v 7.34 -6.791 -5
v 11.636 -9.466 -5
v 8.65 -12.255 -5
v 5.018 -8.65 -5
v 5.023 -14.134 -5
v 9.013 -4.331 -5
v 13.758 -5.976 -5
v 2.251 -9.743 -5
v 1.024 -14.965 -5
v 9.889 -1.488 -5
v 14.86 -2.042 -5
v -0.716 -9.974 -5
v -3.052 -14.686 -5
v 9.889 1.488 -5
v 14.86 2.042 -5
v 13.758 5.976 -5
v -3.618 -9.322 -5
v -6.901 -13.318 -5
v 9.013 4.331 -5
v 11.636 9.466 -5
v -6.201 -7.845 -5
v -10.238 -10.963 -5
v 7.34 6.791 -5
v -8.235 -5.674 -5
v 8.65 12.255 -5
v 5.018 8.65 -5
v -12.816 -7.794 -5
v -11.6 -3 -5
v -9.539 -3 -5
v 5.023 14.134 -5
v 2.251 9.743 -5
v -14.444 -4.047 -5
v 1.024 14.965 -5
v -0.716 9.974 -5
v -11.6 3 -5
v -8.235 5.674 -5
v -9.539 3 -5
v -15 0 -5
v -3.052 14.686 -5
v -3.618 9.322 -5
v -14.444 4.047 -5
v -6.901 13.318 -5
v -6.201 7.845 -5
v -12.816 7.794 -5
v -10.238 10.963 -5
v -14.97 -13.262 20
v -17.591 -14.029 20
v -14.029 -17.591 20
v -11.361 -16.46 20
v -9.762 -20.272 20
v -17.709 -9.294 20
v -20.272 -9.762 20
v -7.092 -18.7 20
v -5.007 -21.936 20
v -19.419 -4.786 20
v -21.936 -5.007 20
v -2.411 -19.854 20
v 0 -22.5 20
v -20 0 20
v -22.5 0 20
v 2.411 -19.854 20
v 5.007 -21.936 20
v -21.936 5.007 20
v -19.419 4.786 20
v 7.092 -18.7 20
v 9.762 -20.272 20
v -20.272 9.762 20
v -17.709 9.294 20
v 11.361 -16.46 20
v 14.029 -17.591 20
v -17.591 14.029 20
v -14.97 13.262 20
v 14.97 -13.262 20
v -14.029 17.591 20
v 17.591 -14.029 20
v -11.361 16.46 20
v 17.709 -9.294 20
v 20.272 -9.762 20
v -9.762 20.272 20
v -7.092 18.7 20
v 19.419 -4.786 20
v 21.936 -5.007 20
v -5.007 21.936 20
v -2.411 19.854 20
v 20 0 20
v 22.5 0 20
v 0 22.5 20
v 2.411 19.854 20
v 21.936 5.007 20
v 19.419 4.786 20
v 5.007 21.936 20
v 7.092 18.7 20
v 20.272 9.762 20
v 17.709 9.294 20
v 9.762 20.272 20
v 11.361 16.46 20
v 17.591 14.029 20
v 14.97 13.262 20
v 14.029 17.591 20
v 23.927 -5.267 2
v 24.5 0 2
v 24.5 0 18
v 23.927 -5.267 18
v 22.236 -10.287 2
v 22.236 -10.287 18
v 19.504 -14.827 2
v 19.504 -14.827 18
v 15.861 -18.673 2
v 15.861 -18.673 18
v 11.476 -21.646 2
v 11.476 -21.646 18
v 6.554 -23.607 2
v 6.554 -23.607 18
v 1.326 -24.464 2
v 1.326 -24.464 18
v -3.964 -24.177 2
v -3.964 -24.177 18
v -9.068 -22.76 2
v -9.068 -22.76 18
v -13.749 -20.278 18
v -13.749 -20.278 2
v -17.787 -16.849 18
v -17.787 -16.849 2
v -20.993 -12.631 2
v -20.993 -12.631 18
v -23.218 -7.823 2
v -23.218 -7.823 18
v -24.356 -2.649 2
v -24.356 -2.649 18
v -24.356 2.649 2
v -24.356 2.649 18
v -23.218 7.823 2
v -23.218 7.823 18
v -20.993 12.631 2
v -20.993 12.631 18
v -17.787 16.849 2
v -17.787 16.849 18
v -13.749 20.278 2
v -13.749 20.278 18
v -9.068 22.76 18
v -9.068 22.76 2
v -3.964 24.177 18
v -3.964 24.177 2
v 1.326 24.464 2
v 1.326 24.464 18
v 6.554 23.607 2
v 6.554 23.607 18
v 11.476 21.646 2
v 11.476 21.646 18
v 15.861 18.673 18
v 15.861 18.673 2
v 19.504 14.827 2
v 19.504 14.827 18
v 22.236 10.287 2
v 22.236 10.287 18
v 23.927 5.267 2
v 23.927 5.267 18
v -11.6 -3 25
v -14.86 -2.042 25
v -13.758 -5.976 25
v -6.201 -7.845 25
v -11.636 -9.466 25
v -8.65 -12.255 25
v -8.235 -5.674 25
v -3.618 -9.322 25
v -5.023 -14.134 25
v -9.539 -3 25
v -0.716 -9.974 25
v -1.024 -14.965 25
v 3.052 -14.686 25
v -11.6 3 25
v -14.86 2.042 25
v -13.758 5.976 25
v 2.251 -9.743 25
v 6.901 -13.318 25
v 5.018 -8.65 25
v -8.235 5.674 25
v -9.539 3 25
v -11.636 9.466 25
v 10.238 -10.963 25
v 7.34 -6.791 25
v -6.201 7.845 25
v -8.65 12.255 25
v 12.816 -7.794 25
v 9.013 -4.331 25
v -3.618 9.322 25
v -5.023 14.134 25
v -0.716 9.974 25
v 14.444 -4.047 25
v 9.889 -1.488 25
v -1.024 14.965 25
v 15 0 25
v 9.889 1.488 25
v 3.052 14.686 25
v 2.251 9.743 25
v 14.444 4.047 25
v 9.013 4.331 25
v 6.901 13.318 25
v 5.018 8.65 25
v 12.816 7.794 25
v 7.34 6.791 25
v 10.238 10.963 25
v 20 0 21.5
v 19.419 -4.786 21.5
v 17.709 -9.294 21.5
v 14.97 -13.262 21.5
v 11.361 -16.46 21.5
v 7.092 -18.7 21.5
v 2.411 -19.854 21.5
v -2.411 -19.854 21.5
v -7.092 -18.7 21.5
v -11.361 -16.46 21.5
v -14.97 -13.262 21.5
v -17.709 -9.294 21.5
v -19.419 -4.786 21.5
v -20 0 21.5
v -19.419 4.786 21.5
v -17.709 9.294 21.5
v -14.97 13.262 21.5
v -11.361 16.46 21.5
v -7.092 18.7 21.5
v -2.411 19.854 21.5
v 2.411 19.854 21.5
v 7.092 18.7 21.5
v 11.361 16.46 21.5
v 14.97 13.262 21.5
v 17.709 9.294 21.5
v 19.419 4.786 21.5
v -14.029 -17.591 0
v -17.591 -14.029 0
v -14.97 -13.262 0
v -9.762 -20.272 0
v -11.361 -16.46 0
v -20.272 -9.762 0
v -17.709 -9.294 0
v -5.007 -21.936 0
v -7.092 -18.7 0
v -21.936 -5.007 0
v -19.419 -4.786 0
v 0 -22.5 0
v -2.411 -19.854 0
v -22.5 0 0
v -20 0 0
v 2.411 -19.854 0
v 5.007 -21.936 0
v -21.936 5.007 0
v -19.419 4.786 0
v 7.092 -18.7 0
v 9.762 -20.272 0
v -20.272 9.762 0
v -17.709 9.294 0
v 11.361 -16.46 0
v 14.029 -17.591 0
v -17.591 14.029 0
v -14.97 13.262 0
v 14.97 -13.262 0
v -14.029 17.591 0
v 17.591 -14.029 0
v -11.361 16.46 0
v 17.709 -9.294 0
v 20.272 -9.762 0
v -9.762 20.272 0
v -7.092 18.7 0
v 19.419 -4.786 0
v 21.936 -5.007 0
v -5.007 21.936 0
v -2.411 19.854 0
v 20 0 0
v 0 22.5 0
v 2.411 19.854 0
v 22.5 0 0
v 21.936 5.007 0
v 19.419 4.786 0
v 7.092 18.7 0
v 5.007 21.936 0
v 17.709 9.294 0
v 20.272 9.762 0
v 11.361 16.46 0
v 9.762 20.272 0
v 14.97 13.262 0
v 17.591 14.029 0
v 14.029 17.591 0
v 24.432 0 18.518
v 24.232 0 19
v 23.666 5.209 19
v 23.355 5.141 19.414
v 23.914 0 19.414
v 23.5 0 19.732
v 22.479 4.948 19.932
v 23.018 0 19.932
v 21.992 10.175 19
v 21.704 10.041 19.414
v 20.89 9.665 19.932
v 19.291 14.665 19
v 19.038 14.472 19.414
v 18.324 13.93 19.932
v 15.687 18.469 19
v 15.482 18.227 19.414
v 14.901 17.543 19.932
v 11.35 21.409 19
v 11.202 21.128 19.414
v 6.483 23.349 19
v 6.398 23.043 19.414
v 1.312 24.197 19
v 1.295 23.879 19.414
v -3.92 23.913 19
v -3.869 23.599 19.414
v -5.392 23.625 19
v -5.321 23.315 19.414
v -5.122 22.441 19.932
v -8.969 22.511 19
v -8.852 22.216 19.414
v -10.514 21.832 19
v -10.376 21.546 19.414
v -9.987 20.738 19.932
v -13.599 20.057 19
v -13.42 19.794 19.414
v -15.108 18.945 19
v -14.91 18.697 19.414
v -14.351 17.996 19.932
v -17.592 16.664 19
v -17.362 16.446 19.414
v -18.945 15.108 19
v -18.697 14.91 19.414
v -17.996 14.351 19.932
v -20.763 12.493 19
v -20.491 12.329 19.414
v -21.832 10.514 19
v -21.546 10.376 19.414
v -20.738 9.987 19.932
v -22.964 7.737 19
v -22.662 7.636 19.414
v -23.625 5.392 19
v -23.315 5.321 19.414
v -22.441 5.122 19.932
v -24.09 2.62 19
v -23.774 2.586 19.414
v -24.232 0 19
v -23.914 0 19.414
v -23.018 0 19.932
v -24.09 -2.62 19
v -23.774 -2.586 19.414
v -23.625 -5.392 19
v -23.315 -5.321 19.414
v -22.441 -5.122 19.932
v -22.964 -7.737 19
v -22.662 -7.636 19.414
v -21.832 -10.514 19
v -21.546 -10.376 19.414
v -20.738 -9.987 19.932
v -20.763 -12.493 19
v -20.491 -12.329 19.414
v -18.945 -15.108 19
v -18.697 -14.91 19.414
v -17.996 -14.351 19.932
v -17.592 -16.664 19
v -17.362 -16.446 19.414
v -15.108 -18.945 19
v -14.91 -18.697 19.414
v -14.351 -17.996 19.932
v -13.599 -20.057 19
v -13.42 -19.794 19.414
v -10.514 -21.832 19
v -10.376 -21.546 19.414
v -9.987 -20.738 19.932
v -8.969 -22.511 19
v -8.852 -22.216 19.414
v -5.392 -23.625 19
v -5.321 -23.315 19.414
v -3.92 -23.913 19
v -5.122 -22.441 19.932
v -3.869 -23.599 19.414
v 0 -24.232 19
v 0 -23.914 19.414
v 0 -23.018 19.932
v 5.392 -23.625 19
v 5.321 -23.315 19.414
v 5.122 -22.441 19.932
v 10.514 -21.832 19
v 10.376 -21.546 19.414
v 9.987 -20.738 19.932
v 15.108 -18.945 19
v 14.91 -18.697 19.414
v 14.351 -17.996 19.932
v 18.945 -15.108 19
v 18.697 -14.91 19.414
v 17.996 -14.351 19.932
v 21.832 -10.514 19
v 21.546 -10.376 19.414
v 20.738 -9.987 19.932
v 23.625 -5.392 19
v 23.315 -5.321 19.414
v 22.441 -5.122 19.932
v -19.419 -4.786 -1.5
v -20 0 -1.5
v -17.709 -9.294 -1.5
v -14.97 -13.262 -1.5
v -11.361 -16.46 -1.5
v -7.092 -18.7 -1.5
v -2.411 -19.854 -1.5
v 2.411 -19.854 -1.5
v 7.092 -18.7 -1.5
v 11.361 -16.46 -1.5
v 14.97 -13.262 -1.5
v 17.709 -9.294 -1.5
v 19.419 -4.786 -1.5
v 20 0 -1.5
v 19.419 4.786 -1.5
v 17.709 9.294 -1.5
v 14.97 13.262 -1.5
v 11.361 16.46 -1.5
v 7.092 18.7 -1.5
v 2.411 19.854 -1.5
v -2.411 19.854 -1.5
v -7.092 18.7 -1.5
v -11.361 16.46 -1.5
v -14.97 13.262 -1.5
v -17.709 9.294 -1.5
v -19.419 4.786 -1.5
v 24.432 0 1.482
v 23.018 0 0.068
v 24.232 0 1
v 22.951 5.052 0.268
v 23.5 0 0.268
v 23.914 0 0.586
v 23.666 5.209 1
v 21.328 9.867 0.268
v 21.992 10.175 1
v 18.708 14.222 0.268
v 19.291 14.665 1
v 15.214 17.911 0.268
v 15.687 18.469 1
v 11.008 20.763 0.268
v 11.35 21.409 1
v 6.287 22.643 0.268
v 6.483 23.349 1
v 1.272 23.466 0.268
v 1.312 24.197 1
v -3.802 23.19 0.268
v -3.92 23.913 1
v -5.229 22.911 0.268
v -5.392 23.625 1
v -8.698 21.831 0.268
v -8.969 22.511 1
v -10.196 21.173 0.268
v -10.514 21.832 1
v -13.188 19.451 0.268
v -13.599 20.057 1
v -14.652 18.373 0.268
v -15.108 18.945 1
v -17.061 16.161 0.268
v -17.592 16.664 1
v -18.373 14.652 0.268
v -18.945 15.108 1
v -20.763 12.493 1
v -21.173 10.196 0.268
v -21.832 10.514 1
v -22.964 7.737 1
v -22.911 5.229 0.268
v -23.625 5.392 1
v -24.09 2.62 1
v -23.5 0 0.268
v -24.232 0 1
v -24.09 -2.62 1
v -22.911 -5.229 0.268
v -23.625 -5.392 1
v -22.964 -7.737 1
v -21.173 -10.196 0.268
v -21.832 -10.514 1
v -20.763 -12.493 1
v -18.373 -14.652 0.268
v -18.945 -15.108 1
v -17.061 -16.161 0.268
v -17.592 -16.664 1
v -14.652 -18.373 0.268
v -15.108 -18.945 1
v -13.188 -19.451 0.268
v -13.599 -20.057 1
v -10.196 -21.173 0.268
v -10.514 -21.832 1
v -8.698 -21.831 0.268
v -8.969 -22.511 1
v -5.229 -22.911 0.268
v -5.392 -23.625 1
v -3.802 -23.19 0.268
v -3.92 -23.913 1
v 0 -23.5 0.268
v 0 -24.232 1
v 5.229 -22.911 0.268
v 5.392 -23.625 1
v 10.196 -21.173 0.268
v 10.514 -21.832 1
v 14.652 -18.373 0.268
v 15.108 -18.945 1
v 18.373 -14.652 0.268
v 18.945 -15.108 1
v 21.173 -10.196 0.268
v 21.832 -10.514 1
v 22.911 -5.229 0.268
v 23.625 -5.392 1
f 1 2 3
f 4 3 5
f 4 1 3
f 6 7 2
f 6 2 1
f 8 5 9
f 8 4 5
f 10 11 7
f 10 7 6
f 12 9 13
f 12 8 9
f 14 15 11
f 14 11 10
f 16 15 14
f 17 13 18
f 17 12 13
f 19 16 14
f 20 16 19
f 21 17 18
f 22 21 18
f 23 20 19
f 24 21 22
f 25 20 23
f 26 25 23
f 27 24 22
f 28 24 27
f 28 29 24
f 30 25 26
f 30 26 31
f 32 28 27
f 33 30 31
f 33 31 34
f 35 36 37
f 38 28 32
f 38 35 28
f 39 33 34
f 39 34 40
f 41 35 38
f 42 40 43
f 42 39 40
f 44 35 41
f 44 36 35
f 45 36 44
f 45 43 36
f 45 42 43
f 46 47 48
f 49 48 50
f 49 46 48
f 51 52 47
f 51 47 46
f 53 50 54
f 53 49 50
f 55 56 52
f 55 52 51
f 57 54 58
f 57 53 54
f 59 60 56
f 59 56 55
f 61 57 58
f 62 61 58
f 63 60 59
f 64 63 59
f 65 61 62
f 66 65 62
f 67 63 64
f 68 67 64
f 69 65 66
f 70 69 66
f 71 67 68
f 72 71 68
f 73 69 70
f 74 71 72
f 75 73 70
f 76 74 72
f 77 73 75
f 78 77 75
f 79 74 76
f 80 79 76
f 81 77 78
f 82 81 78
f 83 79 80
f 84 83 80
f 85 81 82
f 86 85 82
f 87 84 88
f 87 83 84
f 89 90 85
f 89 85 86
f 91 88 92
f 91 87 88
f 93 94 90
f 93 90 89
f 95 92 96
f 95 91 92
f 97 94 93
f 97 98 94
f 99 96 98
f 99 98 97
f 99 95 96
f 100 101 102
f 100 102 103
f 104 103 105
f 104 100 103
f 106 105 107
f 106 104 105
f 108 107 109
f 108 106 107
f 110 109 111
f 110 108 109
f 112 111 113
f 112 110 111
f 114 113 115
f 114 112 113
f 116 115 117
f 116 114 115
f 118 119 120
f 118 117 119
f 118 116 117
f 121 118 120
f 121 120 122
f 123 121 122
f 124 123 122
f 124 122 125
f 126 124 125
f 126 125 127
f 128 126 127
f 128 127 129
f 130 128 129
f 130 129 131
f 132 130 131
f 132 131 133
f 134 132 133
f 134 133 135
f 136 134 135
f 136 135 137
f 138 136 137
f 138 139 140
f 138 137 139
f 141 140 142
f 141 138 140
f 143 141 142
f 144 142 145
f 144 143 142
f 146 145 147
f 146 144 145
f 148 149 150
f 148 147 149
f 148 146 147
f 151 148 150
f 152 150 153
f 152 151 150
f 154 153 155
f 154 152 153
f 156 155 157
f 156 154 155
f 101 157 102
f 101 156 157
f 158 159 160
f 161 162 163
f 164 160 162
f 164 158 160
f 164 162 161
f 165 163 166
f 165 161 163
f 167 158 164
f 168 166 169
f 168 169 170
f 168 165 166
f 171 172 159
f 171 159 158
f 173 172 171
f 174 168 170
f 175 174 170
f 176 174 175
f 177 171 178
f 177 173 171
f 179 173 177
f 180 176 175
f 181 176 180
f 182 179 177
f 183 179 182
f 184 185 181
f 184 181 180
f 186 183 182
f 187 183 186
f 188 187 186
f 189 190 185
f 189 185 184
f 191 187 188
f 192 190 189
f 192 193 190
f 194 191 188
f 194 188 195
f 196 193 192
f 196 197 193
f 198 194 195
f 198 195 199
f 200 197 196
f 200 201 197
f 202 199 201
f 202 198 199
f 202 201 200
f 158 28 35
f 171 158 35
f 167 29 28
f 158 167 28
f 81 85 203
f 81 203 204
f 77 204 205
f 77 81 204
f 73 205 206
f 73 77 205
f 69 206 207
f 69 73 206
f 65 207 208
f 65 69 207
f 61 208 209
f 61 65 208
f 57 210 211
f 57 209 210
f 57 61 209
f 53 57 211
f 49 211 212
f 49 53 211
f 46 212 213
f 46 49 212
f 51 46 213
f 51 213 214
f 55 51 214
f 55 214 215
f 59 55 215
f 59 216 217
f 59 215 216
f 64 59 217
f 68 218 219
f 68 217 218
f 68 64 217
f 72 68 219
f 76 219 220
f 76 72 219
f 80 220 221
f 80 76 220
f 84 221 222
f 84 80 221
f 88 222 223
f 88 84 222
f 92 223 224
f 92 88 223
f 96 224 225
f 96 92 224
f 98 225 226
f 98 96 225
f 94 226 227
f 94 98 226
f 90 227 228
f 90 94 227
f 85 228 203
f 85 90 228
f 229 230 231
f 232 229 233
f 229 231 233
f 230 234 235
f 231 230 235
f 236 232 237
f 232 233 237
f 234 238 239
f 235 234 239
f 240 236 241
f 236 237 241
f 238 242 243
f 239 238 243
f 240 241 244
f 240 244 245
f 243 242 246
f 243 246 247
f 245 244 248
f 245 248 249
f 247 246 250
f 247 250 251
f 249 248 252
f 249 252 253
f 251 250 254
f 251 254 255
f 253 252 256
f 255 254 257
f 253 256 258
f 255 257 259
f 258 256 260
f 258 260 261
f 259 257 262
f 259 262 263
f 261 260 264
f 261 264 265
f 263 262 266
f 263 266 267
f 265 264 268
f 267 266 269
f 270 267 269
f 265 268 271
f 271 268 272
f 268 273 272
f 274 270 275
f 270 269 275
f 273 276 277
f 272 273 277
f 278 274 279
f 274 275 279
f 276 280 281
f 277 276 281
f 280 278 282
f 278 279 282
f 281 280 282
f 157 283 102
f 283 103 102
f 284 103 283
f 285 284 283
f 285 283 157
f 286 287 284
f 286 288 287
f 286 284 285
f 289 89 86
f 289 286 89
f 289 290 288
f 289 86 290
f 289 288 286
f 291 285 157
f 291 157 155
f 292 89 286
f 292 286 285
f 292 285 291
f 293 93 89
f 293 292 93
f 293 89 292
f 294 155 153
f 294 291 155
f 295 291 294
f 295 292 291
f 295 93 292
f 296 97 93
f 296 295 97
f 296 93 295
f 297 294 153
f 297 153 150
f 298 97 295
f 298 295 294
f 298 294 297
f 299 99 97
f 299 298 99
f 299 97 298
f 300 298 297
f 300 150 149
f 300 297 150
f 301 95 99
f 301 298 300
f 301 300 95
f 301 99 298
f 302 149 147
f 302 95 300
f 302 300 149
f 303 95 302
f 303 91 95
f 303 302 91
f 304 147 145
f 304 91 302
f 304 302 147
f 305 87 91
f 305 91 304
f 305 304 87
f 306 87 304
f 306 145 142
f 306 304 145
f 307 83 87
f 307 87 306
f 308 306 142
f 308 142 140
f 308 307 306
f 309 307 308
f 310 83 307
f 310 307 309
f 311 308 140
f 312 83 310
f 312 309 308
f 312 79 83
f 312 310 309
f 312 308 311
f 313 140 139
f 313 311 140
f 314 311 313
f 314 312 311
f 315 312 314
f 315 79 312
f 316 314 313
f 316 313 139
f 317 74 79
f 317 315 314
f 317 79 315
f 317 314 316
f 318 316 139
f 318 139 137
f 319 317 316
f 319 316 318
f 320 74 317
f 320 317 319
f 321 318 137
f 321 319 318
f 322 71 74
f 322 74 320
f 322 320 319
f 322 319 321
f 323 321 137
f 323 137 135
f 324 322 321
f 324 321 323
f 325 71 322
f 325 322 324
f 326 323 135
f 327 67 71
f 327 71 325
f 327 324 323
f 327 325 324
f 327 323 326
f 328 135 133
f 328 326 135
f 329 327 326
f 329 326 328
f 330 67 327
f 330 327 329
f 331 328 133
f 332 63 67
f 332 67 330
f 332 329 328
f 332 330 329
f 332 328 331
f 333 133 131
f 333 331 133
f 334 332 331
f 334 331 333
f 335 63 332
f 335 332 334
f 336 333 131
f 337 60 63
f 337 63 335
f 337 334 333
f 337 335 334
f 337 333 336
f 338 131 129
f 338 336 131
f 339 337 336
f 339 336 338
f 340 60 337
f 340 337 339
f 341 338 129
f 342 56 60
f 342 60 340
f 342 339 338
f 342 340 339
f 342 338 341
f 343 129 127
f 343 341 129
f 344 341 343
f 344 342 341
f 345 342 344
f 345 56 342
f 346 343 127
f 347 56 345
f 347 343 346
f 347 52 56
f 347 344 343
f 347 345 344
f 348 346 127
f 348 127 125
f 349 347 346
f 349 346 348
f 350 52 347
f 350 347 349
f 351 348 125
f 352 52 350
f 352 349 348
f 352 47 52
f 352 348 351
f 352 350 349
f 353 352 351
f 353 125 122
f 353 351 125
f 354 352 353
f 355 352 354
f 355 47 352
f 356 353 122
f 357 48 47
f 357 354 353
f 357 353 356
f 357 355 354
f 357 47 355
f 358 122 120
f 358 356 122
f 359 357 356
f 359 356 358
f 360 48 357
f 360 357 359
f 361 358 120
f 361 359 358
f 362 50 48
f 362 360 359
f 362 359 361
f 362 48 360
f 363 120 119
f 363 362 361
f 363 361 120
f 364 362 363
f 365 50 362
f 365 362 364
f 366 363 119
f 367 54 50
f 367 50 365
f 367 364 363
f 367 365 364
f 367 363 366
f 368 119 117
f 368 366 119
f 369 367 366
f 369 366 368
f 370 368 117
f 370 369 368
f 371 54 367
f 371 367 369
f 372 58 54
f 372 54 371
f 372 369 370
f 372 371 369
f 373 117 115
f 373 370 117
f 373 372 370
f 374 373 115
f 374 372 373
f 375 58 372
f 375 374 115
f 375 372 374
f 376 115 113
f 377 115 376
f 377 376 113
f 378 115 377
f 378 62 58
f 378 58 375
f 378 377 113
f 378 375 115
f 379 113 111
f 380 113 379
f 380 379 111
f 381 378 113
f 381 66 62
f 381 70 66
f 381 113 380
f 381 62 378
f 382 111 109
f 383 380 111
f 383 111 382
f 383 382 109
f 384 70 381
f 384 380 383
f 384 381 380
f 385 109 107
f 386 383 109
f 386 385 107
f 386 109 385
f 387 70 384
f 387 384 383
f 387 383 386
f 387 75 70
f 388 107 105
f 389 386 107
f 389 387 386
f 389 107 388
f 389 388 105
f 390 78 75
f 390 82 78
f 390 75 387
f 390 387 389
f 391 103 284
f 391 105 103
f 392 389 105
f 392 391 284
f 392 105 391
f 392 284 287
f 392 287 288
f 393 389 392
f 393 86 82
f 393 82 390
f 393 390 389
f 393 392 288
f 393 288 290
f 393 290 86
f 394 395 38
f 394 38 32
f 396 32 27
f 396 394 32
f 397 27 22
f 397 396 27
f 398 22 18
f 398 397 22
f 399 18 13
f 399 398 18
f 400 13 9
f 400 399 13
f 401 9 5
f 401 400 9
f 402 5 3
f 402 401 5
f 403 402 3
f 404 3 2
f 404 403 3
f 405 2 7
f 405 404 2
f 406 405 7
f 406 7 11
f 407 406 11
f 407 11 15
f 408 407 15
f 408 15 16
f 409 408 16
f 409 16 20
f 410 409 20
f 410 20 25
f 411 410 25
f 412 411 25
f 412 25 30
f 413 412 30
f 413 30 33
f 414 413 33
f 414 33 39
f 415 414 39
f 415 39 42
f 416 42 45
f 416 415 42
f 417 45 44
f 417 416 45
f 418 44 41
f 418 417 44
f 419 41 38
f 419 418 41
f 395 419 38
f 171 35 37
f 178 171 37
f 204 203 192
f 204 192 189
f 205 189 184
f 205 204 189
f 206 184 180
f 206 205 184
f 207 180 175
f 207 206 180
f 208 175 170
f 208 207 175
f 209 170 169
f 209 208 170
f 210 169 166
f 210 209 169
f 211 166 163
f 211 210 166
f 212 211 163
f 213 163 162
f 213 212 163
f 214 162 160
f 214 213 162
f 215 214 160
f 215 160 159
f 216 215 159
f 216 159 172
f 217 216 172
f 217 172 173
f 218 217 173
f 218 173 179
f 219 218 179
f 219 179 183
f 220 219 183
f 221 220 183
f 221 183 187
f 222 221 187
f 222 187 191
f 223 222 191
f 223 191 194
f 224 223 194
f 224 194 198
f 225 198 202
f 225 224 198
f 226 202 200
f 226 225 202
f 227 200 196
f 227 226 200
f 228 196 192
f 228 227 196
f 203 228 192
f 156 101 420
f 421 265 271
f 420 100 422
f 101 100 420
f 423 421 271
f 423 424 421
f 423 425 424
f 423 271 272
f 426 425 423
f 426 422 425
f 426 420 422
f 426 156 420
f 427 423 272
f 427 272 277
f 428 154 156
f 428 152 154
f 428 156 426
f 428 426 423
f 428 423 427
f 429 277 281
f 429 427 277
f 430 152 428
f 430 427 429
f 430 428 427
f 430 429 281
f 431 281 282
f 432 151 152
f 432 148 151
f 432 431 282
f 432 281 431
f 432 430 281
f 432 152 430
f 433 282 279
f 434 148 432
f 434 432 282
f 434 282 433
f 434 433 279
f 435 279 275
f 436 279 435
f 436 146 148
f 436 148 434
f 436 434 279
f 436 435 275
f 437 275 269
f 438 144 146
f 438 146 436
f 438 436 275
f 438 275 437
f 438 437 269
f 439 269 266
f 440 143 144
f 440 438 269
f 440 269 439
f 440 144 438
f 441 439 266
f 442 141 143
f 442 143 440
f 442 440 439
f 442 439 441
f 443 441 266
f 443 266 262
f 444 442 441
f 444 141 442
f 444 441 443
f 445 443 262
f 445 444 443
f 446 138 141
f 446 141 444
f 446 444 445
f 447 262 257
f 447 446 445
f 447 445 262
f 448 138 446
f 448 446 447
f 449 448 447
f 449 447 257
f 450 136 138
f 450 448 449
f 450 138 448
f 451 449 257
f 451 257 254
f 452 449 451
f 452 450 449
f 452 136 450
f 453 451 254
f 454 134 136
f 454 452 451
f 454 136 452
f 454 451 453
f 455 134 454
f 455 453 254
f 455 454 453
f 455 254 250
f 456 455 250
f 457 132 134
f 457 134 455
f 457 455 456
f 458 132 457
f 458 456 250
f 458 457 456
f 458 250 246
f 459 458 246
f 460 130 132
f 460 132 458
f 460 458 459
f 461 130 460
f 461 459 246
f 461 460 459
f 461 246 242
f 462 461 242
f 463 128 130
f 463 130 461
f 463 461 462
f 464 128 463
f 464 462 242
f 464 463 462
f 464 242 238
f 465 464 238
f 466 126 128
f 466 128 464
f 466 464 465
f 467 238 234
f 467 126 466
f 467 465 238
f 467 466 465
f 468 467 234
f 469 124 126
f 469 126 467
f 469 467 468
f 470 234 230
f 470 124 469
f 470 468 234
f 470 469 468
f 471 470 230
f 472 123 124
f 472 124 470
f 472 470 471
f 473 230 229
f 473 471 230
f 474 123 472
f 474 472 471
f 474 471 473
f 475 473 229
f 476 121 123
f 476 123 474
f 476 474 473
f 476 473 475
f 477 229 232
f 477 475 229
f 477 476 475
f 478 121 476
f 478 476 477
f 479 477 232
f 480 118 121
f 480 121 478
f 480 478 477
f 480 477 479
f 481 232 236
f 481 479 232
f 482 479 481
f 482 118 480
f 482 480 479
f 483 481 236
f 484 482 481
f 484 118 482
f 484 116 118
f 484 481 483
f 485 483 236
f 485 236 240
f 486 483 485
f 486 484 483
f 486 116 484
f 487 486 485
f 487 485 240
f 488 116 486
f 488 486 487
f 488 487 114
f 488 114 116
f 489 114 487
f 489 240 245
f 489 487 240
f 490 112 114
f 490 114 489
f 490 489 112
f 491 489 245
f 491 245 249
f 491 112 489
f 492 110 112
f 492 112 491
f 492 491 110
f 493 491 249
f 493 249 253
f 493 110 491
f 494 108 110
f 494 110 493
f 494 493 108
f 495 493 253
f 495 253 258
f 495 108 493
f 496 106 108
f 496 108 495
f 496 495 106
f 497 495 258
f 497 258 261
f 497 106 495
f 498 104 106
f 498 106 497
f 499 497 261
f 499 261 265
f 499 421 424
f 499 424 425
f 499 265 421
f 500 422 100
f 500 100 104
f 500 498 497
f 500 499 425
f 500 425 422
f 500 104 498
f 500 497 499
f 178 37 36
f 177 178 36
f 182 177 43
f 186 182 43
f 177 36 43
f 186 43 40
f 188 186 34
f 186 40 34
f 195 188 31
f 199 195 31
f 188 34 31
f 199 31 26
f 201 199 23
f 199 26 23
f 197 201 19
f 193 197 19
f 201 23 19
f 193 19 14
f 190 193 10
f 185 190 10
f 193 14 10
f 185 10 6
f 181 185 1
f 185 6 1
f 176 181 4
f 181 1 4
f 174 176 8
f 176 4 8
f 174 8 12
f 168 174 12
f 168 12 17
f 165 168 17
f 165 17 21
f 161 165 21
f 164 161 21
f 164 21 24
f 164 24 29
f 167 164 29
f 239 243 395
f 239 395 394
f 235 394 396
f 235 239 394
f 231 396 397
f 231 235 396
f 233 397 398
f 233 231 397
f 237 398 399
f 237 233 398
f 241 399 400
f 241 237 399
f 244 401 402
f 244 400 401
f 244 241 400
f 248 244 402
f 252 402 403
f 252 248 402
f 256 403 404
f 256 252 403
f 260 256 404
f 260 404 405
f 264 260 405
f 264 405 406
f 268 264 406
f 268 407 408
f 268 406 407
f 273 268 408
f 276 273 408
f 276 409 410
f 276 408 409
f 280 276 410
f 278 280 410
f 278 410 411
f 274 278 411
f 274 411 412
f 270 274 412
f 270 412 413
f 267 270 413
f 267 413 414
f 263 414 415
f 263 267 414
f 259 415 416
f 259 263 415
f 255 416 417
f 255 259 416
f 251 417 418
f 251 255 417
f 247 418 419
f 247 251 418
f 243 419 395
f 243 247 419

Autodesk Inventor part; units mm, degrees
ref_plane "YZ Plane" through (0, 0, 0) normal (1, 0, 0) x (0, 1, 0)
ref_plane "XZ Plane" through (0, 0, 0) normal (0, 1, 0) x (-1, 0, 0)
ref_plane "XY Plane" through (0, 0, 0) normal (0, 0, 1) x (1, 0, 0)
sketch "草图1" plane through (0, 0, 0) normal (0, 0, 1) x (1, 0, 0)
  circle A0 centre (0, 0) radius 24.5
  dimension "d0" = 49
extrude "拉伸1" add sketch "草图1" along normal blind 20
sketch "草图2" plane through (0, 0, 20) normal (0, 0, 1) x (1, 0, 0)
  circle A0 centre (0, 0) radius 20
  dimension "d3" = 40
extrude "拉伸2" add sketch "草图2" along normal blind 5
chamfer "倒角1" distance 5 distance2 3.5 1 edges at (-20, 0, 25) measured on face at (-2.364, 6.2334, 25)
sketch "草图3" plane through (0, 0, 0) normal (0, 0, -1) x (-1, 0, 0)
  circle A0 centre (0, 0) radius 20
  dimension "d9" = 40
extrude "拉伸3" add sketch "草图3" along normal blind 5
chamfer "倒角2" distance 5 distance2 3.5 1 edges at (20, 0, -5) measured on face at (-7.896, -2.3423, -5)
fillet "圆角1" radius 2 2 edges at (-24.5, 0, 0) (-24.5, 0, 20)
sketch "草图4" plane through (0, 0, -5) normal (0, 0, -1) x (-1, 0, 0)
  circle A0 centre (0, 0) radius 10
  line L0 (11.6, 3) -> (9.5394, 3)
  line L1 (9.5394, 3) -> (9.5394, -3)
  line L2 (9.5394, -3) -> (11.6, -3)
  line L3 (11.6, -3) -> (11.6, 3)
  dimension "d16" = 20
  dimension "d17" = 6
  dimension "d18" = 11.6
extrude "拉伸4" cut sketch "草图4" against normal through all
properties part number "砂轮"
